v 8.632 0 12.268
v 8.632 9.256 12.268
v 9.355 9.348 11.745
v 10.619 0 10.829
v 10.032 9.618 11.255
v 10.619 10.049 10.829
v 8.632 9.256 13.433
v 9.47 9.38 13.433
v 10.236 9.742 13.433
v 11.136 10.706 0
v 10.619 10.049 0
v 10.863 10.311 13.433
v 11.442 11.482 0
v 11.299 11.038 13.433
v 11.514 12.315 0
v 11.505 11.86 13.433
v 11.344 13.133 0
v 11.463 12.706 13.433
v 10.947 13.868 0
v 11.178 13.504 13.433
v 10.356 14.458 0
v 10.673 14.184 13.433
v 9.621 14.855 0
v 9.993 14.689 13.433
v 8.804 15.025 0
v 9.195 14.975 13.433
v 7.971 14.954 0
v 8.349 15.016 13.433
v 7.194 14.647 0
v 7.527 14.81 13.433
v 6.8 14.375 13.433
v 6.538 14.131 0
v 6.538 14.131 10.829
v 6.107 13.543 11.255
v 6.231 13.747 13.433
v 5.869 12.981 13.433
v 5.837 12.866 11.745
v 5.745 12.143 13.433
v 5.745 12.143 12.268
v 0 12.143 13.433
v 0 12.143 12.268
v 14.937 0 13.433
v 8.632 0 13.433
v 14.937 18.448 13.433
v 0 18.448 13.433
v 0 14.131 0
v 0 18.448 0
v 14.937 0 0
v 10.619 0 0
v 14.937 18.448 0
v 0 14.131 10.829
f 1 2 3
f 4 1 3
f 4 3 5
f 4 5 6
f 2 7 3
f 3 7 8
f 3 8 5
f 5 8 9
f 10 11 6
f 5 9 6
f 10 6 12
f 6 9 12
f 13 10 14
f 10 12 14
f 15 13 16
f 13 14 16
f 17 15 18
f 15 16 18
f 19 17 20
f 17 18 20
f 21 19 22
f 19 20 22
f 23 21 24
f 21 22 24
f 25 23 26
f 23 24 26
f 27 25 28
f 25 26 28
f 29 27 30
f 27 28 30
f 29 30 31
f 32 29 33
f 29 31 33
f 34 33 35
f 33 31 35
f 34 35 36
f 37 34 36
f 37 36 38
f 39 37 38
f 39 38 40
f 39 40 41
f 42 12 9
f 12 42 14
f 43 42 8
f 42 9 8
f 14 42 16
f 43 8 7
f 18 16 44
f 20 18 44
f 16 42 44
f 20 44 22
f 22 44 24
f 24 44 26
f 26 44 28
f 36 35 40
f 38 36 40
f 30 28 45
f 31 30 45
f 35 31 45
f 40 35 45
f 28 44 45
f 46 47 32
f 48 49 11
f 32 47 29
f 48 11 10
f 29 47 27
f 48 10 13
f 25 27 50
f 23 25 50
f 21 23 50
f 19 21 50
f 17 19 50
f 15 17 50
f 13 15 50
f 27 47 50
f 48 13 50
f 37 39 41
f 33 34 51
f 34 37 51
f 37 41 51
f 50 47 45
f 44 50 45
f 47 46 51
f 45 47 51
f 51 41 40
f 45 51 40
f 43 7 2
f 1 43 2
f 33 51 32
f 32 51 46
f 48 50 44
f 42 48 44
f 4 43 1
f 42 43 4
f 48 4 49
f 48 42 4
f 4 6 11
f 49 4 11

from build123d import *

# Parameters (mm, degrees)
F3_R     = 2.8871491502
F4_DEPTH = 25


with BuildPart() as f2:
    # F2: sweep along a path in F1
    with BuildLine(Plane.XY) as f2_path:
        Line((10.6192948297, 0), (10.6192948297, 14.1305187717))
        Line((10.6192948297, 14.1305187717), (0, 14.1305187717))
    # F0 (on Front) → F2 (sweep)
    with BuildSketch(Plane.XZ):
        Polygon((10.6192948297, 10.8289821073), (10.6192948297, 0), (14.9371791631, 0), (14.9371791631, 13.4334210306), (8.6316959932, 13.4334210306), (8.6316959932, 12.2682768852), align=None)
    sweep(path=f2_path.line, transition=Transition.RIGHT)

    # F3 (on face) → F4 (cut)
    with BuildSketch(Plane.XY.offset(13.4334210306)):
        with Locations((8.6316959932, 12.1429199353)):
            Circle(F3_R)
    extrude(amount=-F4_DEPTH, mode=Mode.SUBTRACT)


solid = f2.part
